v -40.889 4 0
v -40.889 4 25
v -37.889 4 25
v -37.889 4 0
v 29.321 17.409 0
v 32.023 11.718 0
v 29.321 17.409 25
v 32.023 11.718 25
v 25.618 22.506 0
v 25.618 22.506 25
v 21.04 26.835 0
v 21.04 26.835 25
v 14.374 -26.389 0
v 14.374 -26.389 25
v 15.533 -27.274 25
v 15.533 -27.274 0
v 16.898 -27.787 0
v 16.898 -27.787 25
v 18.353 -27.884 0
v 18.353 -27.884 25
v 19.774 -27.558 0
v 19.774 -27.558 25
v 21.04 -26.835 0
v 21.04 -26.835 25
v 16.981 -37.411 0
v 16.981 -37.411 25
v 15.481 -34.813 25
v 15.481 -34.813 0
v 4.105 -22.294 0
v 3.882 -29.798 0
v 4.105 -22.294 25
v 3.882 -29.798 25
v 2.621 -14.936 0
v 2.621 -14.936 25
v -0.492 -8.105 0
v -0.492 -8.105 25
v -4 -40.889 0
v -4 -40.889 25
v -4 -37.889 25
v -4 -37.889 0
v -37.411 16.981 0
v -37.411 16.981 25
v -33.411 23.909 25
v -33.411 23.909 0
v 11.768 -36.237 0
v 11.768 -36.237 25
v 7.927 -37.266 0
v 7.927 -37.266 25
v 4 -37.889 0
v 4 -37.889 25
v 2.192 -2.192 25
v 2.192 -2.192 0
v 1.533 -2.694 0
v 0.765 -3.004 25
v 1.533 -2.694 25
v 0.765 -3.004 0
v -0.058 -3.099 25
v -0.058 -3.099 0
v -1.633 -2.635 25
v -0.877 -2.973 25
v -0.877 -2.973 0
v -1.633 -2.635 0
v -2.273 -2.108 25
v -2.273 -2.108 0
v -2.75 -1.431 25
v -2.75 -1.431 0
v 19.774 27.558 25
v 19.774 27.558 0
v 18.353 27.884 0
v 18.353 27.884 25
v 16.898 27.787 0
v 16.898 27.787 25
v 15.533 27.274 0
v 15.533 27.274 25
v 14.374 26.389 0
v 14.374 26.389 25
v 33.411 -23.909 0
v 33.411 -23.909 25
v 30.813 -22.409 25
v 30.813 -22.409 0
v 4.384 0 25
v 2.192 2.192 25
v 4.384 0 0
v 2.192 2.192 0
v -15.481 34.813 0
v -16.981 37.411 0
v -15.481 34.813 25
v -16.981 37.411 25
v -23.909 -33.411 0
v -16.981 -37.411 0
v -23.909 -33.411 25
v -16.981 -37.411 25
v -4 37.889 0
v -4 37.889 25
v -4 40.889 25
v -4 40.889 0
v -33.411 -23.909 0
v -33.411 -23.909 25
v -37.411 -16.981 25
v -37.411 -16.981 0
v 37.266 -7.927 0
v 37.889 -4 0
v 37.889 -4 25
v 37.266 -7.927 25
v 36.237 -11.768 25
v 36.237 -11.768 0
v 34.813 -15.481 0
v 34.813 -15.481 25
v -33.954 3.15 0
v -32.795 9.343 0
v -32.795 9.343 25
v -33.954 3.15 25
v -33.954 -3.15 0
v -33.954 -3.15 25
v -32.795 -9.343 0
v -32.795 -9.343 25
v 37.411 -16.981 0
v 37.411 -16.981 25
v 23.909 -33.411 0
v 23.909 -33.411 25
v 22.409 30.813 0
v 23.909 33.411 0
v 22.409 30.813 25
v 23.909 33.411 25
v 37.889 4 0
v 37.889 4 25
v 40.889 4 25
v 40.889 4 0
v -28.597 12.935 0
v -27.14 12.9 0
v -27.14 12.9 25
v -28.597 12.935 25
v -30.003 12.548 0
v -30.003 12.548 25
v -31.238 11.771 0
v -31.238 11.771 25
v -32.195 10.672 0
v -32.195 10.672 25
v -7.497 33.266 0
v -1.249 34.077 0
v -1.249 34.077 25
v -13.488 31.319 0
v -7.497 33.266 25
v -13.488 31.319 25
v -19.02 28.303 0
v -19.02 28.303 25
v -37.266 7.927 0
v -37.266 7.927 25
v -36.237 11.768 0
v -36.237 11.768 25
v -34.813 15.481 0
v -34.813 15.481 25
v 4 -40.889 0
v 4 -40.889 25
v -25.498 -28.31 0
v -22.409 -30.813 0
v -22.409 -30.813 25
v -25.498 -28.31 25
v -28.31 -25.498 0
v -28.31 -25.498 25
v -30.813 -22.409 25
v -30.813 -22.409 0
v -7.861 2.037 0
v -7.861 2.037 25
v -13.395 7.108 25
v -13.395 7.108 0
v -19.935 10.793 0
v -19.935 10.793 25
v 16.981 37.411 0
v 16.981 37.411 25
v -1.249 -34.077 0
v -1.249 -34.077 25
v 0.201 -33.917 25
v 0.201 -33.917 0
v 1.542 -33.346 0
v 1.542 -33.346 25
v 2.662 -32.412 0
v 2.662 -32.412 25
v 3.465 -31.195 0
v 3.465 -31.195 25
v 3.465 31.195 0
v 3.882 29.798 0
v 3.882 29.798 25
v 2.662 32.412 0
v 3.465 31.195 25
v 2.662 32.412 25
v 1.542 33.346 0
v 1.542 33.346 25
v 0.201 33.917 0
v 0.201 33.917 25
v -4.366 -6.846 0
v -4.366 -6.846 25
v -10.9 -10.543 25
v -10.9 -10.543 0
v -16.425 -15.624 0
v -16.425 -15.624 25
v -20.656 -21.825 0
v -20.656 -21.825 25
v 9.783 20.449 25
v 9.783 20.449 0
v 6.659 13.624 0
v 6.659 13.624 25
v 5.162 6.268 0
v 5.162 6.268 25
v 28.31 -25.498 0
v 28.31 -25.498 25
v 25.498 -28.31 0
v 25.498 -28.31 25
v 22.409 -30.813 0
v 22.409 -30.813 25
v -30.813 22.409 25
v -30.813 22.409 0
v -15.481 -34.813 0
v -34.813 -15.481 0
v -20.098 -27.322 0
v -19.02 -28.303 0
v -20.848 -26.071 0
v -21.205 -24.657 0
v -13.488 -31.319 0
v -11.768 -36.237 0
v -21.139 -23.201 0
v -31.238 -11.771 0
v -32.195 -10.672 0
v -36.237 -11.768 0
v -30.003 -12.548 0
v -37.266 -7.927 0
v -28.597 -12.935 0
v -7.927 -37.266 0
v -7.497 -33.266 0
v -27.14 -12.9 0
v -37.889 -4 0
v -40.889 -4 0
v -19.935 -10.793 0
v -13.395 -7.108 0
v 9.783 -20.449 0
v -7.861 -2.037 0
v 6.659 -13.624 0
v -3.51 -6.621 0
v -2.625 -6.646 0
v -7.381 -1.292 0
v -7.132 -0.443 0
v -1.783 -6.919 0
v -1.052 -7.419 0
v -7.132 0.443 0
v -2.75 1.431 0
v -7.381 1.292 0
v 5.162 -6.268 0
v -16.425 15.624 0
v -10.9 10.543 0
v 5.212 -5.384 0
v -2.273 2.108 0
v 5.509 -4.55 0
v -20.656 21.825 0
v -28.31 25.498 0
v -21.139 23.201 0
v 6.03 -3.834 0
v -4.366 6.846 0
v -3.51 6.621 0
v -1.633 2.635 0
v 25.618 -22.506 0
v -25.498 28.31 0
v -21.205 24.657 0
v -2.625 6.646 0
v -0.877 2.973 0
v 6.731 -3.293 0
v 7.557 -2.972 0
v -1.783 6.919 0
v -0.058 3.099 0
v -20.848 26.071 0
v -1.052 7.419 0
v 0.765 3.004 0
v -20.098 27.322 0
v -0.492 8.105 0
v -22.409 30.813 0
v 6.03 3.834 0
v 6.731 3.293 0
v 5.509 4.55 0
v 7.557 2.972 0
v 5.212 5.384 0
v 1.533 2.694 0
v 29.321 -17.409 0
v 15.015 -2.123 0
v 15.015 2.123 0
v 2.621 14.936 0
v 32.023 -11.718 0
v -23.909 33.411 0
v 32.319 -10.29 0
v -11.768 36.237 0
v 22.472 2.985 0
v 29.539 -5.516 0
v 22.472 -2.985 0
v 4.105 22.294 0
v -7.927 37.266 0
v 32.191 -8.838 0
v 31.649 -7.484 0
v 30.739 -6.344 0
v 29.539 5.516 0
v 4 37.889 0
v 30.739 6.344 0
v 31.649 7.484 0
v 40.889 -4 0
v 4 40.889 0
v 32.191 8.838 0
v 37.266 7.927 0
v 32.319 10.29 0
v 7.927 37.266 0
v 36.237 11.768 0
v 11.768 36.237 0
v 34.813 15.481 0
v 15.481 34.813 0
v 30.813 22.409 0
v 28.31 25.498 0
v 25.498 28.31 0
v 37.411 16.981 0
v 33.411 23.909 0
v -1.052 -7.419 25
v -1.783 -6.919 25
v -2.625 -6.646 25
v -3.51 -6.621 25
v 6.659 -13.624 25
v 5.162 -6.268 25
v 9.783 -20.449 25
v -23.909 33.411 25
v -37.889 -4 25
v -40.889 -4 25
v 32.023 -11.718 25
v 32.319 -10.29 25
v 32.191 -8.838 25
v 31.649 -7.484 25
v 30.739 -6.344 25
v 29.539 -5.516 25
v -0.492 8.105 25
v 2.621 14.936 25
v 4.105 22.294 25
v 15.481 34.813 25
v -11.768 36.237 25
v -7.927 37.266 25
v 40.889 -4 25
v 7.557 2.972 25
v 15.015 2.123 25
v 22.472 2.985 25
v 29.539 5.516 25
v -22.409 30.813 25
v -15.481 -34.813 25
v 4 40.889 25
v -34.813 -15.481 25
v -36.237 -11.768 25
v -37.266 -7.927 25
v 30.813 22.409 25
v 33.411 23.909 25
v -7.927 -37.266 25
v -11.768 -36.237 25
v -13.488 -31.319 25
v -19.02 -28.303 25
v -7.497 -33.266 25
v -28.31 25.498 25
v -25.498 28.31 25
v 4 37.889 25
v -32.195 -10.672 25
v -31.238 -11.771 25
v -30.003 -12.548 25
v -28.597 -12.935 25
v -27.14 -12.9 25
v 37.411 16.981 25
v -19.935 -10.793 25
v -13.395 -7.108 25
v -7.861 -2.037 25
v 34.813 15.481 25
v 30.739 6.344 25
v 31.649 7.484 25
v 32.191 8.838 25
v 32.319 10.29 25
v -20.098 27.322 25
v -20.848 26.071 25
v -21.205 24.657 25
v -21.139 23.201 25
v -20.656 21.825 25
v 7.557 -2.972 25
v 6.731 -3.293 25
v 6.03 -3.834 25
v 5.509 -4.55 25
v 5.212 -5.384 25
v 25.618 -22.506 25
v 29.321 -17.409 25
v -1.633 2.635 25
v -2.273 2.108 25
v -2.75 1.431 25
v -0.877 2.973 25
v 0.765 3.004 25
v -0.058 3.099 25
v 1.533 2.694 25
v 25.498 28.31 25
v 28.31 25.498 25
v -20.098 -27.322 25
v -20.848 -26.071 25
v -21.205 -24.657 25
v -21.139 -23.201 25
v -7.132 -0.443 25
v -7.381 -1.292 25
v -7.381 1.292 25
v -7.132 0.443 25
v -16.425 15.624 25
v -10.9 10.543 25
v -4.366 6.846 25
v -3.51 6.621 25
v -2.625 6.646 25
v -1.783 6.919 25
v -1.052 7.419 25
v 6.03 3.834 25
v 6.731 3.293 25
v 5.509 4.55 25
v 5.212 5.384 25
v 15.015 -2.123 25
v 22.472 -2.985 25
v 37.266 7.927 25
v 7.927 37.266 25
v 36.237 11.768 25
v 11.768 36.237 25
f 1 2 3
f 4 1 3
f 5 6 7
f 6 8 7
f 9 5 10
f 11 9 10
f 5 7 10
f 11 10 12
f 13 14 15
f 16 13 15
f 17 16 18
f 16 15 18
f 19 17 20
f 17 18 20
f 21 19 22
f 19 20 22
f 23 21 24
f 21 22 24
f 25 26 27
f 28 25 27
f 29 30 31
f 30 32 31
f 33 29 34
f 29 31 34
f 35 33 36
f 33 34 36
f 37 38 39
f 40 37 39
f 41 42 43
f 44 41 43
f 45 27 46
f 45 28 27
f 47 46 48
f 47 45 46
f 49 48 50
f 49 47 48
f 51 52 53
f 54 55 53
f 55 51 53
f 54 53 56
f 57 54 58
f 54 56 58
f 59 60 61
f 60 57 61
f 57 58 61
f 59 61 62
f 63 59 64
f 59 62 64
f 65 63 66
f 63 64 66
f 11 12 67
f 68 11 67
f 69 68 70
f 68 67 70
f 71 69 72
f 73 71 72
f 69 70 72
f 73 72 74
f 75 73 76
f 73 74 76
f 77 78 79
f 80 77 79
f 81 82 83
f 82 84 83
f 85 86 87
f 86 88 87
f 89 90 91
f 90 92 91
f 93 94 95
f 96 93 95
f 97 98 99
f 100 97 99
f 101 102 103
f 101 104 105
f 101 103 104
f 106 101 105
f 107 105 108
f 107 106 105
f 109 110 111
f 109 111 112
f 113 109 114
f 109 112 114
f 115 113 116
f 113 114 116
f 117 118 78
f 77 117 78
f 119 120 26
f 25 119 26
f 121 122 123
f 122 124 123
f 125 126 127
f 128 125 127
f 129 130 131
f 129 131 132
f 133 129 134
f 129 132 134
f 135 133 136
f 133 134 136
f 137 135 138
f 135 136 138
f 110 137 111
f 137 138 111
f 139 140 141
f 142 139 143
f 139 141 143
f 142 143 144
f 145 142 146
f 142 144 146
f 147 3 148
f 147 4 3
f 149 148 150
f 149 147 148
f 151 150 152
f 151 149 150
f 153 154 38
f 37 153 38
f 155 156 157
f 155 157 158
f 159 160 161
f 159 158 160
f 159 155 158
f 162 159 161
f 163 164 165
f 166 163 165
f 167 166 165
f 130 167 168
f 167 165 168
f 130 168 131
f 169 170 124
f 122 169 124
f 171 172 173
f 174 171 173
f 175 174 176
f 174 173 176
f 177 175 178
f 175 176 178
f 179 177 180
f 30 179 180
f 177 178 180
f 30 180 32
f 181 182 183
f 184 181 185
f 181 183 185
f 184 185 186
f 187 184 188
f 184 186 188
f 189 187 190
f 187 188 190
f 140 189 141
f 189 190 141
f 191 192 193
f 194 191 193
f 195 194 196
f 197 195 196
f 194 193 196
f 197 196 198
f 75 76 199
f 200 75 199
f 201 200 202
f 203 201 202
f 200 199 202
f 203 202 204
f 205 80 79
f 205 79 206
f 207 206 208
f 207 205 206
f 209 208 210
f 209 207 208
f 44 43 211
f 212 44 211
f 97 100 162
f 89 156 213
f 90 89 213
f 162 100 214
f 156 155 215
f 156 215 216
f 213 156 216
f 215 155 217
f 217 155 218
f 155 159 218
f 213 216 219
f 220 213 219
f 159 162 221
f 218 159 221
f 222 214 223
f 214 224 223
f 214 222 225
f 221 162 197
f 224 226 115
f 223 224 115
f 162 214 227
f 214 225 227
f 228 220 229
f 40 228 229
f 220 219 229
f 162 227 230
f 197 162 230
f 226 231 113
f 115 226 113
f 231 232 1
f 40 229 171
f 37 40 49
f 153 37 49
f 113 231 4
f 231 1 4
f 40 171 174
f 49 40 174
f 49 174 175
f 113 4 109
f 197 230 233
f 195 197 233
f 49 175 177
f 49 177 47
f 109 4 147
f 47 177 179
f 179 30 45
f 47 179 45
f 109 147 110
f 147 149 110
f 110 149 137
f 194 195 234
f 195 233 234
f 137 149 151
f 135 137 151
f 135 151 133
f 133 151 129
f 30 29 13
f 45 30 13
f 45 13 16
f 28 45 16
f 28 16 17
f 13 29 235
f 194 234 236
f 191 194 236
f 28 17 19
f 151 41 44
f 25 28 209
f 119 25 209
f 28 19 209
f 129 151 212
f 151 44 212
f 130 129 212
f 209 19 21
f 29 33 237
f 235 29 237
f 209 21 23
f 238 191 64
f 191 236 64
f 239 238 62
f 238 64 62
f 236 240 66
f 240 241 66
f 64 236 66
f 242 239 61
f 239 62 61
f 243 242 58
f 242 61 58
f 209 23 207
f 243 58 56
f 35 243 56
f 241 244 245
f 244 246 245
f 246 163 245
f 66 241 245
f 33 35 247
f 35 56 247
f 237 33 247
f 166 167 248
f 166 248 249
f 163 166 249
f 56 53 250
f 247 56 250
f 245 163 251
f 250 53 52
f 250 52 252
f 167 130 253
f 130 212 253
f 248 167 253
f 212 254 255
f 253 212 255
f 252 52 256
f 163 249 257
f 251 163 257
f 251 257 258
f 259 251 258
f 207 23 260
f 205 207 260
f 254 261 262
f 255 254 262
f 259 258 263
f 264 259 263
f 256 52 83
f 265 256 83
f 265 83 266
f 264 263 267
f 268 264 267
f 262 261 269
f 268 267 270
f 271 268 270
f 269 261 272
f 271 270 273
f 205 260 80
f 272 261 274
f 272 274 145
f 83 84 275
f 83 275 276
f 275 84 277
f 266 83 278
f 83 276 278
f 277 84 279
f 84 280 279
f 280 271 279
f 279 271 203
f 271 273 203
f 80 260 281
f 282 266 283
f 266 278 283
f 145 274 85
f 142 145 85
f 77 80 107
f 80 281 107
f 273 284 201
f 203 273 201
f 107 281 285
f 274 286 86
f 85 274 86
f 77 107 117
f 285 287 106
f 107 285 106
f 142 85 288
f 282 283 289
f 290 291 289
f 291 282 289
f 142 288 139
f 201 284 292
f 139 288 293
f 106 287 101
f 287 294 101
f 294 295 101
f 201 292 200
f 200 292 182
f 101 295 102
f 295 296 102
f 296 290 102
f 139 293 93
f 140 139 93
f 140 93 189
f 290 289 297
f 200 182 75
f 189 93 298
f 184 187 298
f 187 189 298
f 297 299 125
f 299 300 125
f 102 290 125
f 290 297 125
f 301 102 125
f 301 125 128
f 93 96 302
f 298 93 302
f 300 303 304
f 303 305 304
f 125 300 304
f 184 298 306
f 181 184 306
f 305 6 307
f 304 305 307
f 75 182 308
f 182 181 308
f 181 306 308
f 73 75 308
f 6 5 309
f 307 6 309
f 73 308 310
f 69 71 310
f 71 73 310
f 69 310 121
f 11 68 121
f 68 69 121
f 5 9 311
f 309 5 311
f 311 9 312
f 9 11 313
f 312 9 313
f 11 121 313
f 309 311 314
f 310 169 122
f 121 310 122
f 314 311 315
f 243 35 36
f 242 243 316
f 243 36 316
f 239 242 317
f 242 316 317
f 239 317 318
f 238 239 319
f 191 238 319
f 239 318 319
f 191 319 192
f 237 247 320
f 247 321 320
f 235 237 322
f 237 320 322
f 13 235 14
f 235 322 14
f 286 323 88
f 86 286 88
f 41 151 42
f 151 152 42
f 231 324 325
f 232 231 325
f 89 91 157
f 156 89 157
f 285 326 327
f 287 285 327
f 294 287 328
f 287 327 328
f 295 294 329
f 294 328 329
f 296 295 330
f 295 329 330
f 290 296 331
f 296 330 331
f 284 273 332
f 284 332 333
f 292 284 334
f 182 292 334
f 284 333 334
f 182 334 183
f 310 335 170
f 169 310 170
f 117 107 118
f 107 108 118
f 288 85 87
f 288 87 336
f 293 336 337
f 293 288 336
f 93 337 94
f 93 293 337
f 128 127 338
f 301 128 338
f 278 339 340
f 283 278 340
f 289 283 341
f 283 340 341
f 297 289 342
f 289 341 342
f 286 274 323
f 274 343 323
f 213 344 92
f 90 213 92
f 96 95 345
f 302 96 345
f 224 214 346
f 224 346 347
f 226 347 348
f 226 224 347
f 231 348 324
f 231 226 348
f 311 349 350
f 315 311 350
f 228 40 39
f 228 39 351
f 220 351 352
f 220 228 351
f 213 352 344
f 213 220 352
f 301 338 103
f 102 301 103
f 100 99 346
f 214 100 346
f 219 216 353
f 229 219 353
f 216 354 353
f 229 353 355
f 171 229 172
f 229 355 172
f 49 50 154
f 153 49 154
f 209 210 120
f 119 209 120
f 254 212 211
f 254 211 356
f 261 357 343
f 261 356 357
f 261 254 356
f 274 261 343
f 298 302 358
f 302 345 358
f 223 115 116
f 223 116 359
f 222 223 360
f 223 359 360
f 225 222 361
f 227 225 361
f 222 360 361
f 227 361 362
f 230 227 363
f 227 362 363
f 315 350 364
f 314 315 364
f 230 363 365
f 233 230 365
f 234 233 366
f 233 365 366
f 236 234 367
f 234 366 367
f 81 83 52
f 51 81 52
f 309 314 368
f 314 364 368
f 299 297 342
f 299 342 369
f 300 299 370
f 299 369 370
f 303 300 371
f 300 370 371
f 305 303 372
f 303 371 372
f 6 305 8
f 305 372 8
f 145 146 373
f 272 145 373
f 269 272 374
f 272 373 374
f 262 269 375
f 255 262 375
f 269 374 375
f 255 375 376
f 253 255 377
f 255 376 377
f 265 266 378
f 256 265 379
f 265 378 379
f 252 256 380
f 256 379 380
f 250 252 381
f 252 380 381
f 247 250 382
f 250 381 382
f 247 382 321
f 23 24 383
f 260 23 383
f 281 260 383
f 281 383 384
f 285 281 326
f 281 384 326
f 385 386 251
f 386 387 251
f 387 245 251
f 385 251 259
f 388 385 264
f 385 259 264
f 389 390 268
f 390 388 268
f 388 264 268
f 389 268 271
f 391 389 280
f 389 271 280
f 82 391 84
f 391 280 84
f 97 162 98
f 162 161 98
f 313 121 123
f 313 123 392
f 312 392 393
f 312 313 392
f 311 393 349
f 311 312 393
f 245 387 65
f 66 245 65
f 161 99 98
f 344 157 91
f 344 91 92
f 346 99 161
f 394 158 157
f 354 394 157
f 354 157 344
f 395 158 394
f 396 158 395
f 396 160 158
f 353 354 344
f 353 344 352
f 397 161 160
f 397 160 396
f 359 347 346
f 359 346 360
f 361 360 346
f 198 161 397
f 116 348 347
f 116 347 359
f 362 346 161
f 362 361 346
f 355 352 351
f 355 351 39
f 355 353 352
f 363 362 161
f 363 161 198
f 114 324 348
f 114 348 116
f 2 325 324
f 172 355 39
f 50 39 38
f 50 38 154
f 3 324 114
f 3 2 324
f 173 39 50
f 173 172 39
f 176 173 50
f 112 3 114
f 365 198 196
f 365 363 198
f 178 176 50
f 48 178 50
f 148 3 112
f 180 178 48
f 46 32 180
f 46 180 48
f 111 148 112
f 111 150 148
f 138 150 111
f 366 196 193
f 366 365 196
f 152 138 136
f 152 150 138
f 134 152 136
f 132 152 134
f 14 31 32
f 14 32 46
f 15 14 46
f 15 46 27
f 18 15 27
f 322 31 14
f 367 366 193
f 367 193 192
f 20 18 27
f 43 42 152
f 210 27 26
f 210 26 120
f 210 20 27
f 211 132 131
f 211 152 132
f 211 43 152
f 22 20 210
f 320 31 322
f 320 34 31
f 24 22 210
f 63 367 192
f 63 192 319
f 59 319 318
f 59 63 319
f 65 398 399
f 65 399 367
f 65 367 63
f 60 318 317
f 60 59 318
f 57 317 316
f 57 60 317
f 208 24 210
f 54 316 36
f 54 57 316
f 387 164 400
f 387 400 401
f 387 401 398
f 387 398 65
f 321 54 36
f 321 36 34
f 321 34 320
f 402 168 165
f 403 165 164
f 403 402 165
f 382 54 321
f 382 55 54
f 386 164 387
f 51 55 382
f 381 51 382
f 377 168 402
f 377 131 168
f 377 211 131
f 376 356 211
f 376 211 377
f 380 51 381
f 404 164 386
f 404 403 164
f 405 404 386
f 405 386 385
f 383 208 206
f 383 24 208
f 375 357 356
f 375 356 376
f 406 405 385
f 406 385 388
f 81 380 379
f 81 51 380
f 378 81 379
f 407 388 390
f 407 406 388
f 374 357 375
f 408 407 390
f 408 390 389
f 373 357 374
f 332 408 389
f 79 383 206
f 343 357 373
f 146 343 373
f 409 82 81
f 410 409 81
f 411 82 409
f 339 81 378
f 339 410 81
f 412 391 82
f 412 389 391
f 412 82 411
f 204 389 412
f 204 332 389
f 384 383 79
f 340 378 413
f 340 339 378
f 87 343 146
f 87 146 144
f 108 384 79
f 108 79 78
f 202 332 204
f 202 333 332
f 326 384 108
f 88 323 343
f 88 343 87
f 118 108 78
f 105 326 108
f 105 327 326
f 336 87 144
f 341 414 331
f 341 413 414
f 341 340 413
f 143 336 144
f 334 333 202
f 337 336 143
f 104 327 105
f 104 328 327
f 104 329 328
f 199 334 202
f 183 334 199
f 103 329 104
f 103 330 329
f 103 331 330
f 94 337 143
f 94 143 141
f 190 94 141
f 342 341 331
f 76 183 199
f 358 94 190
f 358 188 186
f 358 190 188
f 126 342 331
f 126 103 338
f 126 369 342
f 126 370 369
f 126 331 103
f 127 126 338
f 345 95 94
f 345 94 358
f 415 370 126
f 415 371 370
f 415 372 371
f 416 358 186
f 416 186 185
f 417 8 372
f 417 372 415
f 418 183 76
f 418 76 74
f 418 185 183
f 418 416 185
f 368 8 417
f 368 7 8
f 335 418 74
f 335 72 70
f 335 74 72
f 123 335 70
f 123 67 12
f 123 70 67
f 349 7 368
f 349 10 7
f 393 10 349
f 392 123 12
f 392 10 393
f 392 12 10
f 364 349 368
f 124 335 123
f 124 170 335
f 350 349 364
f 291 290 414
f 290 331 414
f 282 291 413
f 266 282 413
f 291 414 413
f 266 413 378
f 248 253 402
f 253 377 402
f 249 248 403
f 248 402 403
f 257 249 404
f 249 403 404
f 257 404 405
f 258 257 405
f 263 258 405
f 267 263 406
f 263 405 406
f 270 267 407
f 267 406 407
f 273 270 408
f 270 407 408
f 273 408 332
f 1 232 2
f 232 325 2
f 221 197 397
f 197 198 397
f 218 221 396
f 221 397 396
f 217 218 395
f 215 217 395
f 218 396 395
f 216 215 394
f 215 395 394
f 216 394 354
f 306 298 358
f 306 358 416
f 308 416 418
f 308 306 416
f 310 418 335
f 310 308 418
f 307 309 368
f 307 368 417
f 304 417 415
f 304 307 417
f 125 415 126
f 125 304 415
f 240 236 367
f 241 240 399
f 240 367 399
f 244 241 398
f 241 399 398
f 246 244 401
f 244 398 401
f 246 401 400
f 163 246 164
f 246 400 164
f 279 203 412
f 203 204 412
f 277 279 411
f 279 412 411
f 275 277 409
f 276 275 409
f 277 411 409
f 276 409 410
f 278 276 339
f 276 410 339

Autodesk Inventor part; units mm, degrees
ref_plane "YZ Plane" through (0, 0, 0) normal (1, 0, 0) x (0, 1, 0)
ref_plane "XZ Plane" through (0, 0, 0) normal (0, 1, 0) x (-1, 0, 0)
ref_plane "XY Plane" through (0, 0, 0) normal (0, 0, 1) x (1, 0, 0)
sketch "Sketch1" plane through (0, 0, 0) normal (0, 0, 1) x (1, 0, 0)
  circle A0 centre (0, 0) radius 38.1
  circle A1 centre (0, 0) radius 3.1
  line L0 (-2.75, 1.4309) -> (-2.75, -1.4309)
  line L1 (2.192, 2.192) -> (4.3841, 0)
  line L2 (4.3841, 0) -> (2.192, -2.192)
  dimension "d0" = 76.2
  dimension "d1" = 6.2
  dimension "d2" = 2.75
extrude "Extrusion1" add sketch "Sketch1" along normal blind 25 contours A0 | L0 A1 picked at (-2.8371, 0.2455)
sketch "Sketch3" plane through (0, 0, 25) normal (0, 0, 1) x (1, 0, 0)
  circle A0 centre (0, 0) radius 38.1 projected
  line L0 (4.3841, 0) -> (2.192, -2.192) projected
  arc A1 (-2.75, -1.4309) -> (2.192, -2.192) centre (0, 0) ccw projected
  line L1 (-2.75, -1.4309) -> (-2.75, 1.4309) projected
  arc A2 (2.192, 2.192) -> (-2.75, 1.4309) centre (0, 0) ccw projected
  line L2 (2.192, 2.192) -> (4.3841, 0) projected
  line L3 (0, 0) -> (38.1, 0) construction
  circle A3 centre (0, 0) radius 7.1
  circle A4 centre (0, 0) radius 34.1
  circle A5 centre (0, 0) radius 3.1 construction
  circle A6 centre (27.3278, 10) radius 5
  circle A7 centre (27.3278, -10) radius 5
  line L4 (27.3278, 10) -> (27.3278, 0) construction
  line L5 (27.3278, -10) -> (27.3278, 0) construction
  circle A8 centre (8.2583, 6) radius 3.1078
  circle A9 centre (8.2583, -6) radius 3.1078
  line L6 (8.2583, 6) -> (8.2583, 0) construction
  line L7 (8.2583, -6) -> (8.2583, 0) construction
  arc A10 (7.5566, 2.9724) -> (29.5391, 5.5155) centre (14.9864, 35.0288) ccw
  arc A11 (29.5391, -5.5155) -> (7.5566, -2.9724) centre (14.9864, -35.0288) ccw
  circle A12 centre (17.9553, 22.9001) radius 5
  arc A13 (14.3737, 26.3889) -> (5.1621, 6.2682) centre (37.9454, 3.4284) ccw
  circle A14 centre (-1.0658, 29.0805) radius 5
  circle A15 centre (-16.2308, 24.1531) radius 5
  circle A16 centre (-27.9865, 7.9727) radius 5
  circle A17 centre (-27.9865, -7.9727) radius 5
  circle A18 centre (-16.2308, -24.1531) radius 5
  circle A19 centre (17.9553, -22.9001) radius 5
  circle A20 centre (-1.0658, -29.0805) radius 5
  circle A21 centre (-3.1544, 9.7082) radius 3.1078
  circle A22 centre (-10.2078, 0) radius 3.1078
  circle A23 centre (-3.1544, -9.7082) radius 3.1078
  arc A24 (-0.4919, 8.1053) -> (3.8825, 29.7977) centre (-28.6833, 25.0774) ccw
  arc A25 (5.1621, -6.2682) -> (14.3737, -26.3889) centre (37.9454, -3.4284) ccw
  arc A26 (3.8825, -29.7977) -> (-0.4919, -8.1053) centre (-28.6833, -25.0774) ccw
  arc A27 (-4.3662, -6.8464) -> (-20.6557, -21.8248) centre (8.4652, -37.1477) ccw
  arc A28 (-20.6557, 21.8248) -> (-4.3662, 6.8464) centre (8.4652, 37.1477) ccw
  arc A29 (-7.8606, 2.0369) -> (-27.1396, 12.9005) centre (-32.7137, -19.5301) ccw
  arc A30 (-27.1396, -12.9005) -> (-7.8606, -2.0369) centre (-32.7137, 19.5301) ccw
  line L8 (8.2583, 6) -> (-3.1544, 9.7082) construction
  line L9 (-3.1544, 9.7082) -> (-10.2078, 0) construction
  line L10 (-10.2078, 0) -> (-3.1544, -9.7082) construction
  line L11 (-3.1544, -9.7082) -> (8.2583, -6) construction
  line L12 (17.9553, 22.9001) -> (-1.0658, 29.0805) construction
  line L13 (-16.2308, 24.1531) -> (-27.9865, 7.9727) construction
  line L14 (-27.9865, -7.9727) -> (-16.2308, -24.1531) construction
  line L15 (-1.0658, -29.0805) -> (17.9553, -22.9001) construction
  point P0 (21.0404, -26.8349)
  point P1 (32.0233, -11.7182)
  point P2 (-19.0196, -28.3031)
  point P3 (-1.2489, -34.0771)
  point P4 (-32.7952, 9.3426)
  point P5 (-32.7952, -9.3426)
  point P6 (-1.2489, 34.0771)
  point P7 (-19.0196, 28.3031)
  point P8 (32.0233, 11.7182)
  point P9 (21.0404, 26.8349)
  dimension "d32" = 10
  dimension "d25" = 4
  dimension "d26" = 4
  dimension "d29" = 10
  dimension "d30" = 6
  dimension "d31" = 12
extrude "Extrusion4" cut sketch "Sketch3" against normal through all contours A8 | A9 | A21 | A13 A12 A4 A6 A10 A8 | A23 | A11 A7 A4 A19 A25 A9 | A22 | A28 A15 A4 A14 A24 A21 | A12 | A6 | A26 A20 A4 A18 A27 A23 | A7 | A19 | A22 A30 A17 A4 A16 A29 | A15 | A14 | A20 | A18 | A16 | A17
sketch "Sketch4" plane through (0, 0, 25) normal (0, 0, 1) x (1, 0, 0)
  arc A0 (-27.1396, 12.9005) -> (-32.7952, 9.3426) centre (-27.9865, 7.9727) ccw projected
  arc A1 (-7.8606, 2.0369) -> (-27.1396, 12.9005) centre (-32.7137, -19.5301) ccw projected
  arc A2 (-7.8606, -2.0369) -> (-7.8606, 2.0369) centre (-10.2078, 0) ccw projected
  arc A3 (-27.1396, -12.9005) -> (-7.8606, -2.0369) centre (-32.7137, 19.5301) ccw projected
  arc A4 (-32.7952, -9.3426) -> (-27.1396, -12.9005) centre (-27.9865, -7.9727) ccw projected
  arc A5 (-32.7952, 9.3426) -> (-32.7952, -9.3426) centre (0, 0) ccw projected
  arc A6 (3.8825, -29.7977) -> (-0.4919, -8.1053) centre (-28.6833, -25.0774) ccw projected
  arc A7 (-1.2489, -34.0771) -> (3.8825, -29.7977) centre (-1.0658, -29.0805) ccw projected
  arc A8 (-19.0196, -28.3031) -> (-1.2489, -34.0771) centre (0, 0) ccw projected
  arc A9 (-20.6557, -21.8248) -> (-19.0196, -28.3031) centre (-16.2308, -24.1531) ccw projected
  arc A10 (-4.3662, -6.8464) -> (-20.6557, -21.8248) centre (8.4652, -37.1477) ccw projected
  arc A11 (-0.4919, -8.1053) -> (-4.3662, -6.8464) centre (-3.1544, -9.7082) ccw projected
  arc A12 (-20.6557, 21.8248) -> (-4.3662, 6.8464) centre (8.4652, 37.1477) ccw projected
  arc A13 (-19.0196, 28.3031) -> (-20.6557, 21.8248) centre (-16.2308, 24.1531) ccw projected
  arc A14 (-1.2489, 34.0771) -> (-19.0196, 28.3031) centre (0, 0) ccw projected
  arc A15 (3.8825, 29.7977) -> (-1.2489, 34.0771) centre (-1.0658, 29.0805) ccw projected
  arc A16 (-0.4919, 8.1053) -> (3.8825, 29.7977) centre (-28.6833, 25.0774) ccw projected
  arc A17 (-4.3662, 6.8464) -> (-0.4919, 8.1053) centre (-3.1544, 9.7082) ccw projected
  arc A18 (29.5391, -5.5155) -> (7.5566, -2.9724) centre (14.9864, -35.0288) ccw projected
  arc A19 (32.0233, -11.7182) -> (29.5391, -5.5155) centre (27.3278, -10) ccw projected
  arc A20 (21.0404, -26.8349) -> (32.0233, -11.7182) centre (0, 0) ccw projected
  arc A21 (14.3737, -26.3889) -> (21.0404, -26.8349) centre (17.9553, -22.9001) ccw projected
  arc A22 (5.1621, -6.2682) -> (14.3737, -26.3889) centre (37.9454, -3.4284) ccw projected
  arc A23 (7.5566, -2.9724) -> (5.1621, -6.2682) centre (8.2583, -6) ccw projected
  arc A24 (7.5566, 2.9724) -> (29.5391, 5.5155) centre (14.9864, 35.0288) ccw projected
  arc A25 (5.1621, 6.2682) -> (7.5566, 2.9724) centre (8.2583, 6) ccw projected
  arc A26 (14.3737, 26.3889) -> (5.1621, 6.2682) centre (37.9454, 3.4284) ccw projected
  arc A27 (21.0404, 26.8349) -> (14.3737, 26.3889) centre (17.9553, 22.9001) ccw projected
  arc A28 (32.0233, 11.7182) -> (21.0404, 26.8349) centre (0, 0) ccw projected
  arc A29 (29.5391, 5.5155) -> (32.0233, 11.7182) centre (27.3278, 10) ccw projected
  circle A30 centre (0, 0) radius 38.1 projected
  line L0 (4.3841, 0) -> (2.192, -2.192) projected
  arc A31 (-2.75, -1.4309) -> (2.192, -2.192) centre (0, 0) ccw projected
  line L1 (-2.75, -1.4309) -> (-2.75, 1.4309) projected
  arc A32 (2.192, 2.192) -> (-2.75, 1.4309) centre (0, 0) ccw projected
  line L2 (2.192, 2.192) -> (4.3841, 0) projected
  line L3 (37.8894, 4) -> (40.8894, 4)
  line L4 (40.8894, 4) -> (40.8894, -4)
  line L5 (40.8894, -4) -> (37.8894, -4)
  line L6 (37.8894, -4) -> (37.8894, 4)
  circle A33 centre (0, 0) radius 38.1 projected
  point P0 (40.8894, 0)
  dimension "d41" = 8
  dimension "d42" = 3
extrude "Extrusion5" add sketch "Sketch4" against normal up to surface (25 mm away) contours A30 L3 L4 L5
pattern_circular "Circular Pattern2" count 12 over 360 about axis through (0, 0, 0) along (0, 0, 1) of "Extrusion5"
equation "\"d0\" = Wheel_Diameter"
equation "\"d1\" = Axel_Diamter"
equation "\"d2\" = Axel_Cuttout_Dist"
equation "\"d3\" = Wheel_Thickness"
equation "\"Wheel_Diameter\" = 76.2"
equation "\"Axel_Diamter\" = 6.2"
equation "\"Axel_Cuttout_Dist\" = 2.75"
equation "\"Wheel_Thickness\" = 25"
equation "\"Tread_Height\" = 3"
equation "\"Tread_Width\" = 8"
properties part number "Drive_Wheel"
